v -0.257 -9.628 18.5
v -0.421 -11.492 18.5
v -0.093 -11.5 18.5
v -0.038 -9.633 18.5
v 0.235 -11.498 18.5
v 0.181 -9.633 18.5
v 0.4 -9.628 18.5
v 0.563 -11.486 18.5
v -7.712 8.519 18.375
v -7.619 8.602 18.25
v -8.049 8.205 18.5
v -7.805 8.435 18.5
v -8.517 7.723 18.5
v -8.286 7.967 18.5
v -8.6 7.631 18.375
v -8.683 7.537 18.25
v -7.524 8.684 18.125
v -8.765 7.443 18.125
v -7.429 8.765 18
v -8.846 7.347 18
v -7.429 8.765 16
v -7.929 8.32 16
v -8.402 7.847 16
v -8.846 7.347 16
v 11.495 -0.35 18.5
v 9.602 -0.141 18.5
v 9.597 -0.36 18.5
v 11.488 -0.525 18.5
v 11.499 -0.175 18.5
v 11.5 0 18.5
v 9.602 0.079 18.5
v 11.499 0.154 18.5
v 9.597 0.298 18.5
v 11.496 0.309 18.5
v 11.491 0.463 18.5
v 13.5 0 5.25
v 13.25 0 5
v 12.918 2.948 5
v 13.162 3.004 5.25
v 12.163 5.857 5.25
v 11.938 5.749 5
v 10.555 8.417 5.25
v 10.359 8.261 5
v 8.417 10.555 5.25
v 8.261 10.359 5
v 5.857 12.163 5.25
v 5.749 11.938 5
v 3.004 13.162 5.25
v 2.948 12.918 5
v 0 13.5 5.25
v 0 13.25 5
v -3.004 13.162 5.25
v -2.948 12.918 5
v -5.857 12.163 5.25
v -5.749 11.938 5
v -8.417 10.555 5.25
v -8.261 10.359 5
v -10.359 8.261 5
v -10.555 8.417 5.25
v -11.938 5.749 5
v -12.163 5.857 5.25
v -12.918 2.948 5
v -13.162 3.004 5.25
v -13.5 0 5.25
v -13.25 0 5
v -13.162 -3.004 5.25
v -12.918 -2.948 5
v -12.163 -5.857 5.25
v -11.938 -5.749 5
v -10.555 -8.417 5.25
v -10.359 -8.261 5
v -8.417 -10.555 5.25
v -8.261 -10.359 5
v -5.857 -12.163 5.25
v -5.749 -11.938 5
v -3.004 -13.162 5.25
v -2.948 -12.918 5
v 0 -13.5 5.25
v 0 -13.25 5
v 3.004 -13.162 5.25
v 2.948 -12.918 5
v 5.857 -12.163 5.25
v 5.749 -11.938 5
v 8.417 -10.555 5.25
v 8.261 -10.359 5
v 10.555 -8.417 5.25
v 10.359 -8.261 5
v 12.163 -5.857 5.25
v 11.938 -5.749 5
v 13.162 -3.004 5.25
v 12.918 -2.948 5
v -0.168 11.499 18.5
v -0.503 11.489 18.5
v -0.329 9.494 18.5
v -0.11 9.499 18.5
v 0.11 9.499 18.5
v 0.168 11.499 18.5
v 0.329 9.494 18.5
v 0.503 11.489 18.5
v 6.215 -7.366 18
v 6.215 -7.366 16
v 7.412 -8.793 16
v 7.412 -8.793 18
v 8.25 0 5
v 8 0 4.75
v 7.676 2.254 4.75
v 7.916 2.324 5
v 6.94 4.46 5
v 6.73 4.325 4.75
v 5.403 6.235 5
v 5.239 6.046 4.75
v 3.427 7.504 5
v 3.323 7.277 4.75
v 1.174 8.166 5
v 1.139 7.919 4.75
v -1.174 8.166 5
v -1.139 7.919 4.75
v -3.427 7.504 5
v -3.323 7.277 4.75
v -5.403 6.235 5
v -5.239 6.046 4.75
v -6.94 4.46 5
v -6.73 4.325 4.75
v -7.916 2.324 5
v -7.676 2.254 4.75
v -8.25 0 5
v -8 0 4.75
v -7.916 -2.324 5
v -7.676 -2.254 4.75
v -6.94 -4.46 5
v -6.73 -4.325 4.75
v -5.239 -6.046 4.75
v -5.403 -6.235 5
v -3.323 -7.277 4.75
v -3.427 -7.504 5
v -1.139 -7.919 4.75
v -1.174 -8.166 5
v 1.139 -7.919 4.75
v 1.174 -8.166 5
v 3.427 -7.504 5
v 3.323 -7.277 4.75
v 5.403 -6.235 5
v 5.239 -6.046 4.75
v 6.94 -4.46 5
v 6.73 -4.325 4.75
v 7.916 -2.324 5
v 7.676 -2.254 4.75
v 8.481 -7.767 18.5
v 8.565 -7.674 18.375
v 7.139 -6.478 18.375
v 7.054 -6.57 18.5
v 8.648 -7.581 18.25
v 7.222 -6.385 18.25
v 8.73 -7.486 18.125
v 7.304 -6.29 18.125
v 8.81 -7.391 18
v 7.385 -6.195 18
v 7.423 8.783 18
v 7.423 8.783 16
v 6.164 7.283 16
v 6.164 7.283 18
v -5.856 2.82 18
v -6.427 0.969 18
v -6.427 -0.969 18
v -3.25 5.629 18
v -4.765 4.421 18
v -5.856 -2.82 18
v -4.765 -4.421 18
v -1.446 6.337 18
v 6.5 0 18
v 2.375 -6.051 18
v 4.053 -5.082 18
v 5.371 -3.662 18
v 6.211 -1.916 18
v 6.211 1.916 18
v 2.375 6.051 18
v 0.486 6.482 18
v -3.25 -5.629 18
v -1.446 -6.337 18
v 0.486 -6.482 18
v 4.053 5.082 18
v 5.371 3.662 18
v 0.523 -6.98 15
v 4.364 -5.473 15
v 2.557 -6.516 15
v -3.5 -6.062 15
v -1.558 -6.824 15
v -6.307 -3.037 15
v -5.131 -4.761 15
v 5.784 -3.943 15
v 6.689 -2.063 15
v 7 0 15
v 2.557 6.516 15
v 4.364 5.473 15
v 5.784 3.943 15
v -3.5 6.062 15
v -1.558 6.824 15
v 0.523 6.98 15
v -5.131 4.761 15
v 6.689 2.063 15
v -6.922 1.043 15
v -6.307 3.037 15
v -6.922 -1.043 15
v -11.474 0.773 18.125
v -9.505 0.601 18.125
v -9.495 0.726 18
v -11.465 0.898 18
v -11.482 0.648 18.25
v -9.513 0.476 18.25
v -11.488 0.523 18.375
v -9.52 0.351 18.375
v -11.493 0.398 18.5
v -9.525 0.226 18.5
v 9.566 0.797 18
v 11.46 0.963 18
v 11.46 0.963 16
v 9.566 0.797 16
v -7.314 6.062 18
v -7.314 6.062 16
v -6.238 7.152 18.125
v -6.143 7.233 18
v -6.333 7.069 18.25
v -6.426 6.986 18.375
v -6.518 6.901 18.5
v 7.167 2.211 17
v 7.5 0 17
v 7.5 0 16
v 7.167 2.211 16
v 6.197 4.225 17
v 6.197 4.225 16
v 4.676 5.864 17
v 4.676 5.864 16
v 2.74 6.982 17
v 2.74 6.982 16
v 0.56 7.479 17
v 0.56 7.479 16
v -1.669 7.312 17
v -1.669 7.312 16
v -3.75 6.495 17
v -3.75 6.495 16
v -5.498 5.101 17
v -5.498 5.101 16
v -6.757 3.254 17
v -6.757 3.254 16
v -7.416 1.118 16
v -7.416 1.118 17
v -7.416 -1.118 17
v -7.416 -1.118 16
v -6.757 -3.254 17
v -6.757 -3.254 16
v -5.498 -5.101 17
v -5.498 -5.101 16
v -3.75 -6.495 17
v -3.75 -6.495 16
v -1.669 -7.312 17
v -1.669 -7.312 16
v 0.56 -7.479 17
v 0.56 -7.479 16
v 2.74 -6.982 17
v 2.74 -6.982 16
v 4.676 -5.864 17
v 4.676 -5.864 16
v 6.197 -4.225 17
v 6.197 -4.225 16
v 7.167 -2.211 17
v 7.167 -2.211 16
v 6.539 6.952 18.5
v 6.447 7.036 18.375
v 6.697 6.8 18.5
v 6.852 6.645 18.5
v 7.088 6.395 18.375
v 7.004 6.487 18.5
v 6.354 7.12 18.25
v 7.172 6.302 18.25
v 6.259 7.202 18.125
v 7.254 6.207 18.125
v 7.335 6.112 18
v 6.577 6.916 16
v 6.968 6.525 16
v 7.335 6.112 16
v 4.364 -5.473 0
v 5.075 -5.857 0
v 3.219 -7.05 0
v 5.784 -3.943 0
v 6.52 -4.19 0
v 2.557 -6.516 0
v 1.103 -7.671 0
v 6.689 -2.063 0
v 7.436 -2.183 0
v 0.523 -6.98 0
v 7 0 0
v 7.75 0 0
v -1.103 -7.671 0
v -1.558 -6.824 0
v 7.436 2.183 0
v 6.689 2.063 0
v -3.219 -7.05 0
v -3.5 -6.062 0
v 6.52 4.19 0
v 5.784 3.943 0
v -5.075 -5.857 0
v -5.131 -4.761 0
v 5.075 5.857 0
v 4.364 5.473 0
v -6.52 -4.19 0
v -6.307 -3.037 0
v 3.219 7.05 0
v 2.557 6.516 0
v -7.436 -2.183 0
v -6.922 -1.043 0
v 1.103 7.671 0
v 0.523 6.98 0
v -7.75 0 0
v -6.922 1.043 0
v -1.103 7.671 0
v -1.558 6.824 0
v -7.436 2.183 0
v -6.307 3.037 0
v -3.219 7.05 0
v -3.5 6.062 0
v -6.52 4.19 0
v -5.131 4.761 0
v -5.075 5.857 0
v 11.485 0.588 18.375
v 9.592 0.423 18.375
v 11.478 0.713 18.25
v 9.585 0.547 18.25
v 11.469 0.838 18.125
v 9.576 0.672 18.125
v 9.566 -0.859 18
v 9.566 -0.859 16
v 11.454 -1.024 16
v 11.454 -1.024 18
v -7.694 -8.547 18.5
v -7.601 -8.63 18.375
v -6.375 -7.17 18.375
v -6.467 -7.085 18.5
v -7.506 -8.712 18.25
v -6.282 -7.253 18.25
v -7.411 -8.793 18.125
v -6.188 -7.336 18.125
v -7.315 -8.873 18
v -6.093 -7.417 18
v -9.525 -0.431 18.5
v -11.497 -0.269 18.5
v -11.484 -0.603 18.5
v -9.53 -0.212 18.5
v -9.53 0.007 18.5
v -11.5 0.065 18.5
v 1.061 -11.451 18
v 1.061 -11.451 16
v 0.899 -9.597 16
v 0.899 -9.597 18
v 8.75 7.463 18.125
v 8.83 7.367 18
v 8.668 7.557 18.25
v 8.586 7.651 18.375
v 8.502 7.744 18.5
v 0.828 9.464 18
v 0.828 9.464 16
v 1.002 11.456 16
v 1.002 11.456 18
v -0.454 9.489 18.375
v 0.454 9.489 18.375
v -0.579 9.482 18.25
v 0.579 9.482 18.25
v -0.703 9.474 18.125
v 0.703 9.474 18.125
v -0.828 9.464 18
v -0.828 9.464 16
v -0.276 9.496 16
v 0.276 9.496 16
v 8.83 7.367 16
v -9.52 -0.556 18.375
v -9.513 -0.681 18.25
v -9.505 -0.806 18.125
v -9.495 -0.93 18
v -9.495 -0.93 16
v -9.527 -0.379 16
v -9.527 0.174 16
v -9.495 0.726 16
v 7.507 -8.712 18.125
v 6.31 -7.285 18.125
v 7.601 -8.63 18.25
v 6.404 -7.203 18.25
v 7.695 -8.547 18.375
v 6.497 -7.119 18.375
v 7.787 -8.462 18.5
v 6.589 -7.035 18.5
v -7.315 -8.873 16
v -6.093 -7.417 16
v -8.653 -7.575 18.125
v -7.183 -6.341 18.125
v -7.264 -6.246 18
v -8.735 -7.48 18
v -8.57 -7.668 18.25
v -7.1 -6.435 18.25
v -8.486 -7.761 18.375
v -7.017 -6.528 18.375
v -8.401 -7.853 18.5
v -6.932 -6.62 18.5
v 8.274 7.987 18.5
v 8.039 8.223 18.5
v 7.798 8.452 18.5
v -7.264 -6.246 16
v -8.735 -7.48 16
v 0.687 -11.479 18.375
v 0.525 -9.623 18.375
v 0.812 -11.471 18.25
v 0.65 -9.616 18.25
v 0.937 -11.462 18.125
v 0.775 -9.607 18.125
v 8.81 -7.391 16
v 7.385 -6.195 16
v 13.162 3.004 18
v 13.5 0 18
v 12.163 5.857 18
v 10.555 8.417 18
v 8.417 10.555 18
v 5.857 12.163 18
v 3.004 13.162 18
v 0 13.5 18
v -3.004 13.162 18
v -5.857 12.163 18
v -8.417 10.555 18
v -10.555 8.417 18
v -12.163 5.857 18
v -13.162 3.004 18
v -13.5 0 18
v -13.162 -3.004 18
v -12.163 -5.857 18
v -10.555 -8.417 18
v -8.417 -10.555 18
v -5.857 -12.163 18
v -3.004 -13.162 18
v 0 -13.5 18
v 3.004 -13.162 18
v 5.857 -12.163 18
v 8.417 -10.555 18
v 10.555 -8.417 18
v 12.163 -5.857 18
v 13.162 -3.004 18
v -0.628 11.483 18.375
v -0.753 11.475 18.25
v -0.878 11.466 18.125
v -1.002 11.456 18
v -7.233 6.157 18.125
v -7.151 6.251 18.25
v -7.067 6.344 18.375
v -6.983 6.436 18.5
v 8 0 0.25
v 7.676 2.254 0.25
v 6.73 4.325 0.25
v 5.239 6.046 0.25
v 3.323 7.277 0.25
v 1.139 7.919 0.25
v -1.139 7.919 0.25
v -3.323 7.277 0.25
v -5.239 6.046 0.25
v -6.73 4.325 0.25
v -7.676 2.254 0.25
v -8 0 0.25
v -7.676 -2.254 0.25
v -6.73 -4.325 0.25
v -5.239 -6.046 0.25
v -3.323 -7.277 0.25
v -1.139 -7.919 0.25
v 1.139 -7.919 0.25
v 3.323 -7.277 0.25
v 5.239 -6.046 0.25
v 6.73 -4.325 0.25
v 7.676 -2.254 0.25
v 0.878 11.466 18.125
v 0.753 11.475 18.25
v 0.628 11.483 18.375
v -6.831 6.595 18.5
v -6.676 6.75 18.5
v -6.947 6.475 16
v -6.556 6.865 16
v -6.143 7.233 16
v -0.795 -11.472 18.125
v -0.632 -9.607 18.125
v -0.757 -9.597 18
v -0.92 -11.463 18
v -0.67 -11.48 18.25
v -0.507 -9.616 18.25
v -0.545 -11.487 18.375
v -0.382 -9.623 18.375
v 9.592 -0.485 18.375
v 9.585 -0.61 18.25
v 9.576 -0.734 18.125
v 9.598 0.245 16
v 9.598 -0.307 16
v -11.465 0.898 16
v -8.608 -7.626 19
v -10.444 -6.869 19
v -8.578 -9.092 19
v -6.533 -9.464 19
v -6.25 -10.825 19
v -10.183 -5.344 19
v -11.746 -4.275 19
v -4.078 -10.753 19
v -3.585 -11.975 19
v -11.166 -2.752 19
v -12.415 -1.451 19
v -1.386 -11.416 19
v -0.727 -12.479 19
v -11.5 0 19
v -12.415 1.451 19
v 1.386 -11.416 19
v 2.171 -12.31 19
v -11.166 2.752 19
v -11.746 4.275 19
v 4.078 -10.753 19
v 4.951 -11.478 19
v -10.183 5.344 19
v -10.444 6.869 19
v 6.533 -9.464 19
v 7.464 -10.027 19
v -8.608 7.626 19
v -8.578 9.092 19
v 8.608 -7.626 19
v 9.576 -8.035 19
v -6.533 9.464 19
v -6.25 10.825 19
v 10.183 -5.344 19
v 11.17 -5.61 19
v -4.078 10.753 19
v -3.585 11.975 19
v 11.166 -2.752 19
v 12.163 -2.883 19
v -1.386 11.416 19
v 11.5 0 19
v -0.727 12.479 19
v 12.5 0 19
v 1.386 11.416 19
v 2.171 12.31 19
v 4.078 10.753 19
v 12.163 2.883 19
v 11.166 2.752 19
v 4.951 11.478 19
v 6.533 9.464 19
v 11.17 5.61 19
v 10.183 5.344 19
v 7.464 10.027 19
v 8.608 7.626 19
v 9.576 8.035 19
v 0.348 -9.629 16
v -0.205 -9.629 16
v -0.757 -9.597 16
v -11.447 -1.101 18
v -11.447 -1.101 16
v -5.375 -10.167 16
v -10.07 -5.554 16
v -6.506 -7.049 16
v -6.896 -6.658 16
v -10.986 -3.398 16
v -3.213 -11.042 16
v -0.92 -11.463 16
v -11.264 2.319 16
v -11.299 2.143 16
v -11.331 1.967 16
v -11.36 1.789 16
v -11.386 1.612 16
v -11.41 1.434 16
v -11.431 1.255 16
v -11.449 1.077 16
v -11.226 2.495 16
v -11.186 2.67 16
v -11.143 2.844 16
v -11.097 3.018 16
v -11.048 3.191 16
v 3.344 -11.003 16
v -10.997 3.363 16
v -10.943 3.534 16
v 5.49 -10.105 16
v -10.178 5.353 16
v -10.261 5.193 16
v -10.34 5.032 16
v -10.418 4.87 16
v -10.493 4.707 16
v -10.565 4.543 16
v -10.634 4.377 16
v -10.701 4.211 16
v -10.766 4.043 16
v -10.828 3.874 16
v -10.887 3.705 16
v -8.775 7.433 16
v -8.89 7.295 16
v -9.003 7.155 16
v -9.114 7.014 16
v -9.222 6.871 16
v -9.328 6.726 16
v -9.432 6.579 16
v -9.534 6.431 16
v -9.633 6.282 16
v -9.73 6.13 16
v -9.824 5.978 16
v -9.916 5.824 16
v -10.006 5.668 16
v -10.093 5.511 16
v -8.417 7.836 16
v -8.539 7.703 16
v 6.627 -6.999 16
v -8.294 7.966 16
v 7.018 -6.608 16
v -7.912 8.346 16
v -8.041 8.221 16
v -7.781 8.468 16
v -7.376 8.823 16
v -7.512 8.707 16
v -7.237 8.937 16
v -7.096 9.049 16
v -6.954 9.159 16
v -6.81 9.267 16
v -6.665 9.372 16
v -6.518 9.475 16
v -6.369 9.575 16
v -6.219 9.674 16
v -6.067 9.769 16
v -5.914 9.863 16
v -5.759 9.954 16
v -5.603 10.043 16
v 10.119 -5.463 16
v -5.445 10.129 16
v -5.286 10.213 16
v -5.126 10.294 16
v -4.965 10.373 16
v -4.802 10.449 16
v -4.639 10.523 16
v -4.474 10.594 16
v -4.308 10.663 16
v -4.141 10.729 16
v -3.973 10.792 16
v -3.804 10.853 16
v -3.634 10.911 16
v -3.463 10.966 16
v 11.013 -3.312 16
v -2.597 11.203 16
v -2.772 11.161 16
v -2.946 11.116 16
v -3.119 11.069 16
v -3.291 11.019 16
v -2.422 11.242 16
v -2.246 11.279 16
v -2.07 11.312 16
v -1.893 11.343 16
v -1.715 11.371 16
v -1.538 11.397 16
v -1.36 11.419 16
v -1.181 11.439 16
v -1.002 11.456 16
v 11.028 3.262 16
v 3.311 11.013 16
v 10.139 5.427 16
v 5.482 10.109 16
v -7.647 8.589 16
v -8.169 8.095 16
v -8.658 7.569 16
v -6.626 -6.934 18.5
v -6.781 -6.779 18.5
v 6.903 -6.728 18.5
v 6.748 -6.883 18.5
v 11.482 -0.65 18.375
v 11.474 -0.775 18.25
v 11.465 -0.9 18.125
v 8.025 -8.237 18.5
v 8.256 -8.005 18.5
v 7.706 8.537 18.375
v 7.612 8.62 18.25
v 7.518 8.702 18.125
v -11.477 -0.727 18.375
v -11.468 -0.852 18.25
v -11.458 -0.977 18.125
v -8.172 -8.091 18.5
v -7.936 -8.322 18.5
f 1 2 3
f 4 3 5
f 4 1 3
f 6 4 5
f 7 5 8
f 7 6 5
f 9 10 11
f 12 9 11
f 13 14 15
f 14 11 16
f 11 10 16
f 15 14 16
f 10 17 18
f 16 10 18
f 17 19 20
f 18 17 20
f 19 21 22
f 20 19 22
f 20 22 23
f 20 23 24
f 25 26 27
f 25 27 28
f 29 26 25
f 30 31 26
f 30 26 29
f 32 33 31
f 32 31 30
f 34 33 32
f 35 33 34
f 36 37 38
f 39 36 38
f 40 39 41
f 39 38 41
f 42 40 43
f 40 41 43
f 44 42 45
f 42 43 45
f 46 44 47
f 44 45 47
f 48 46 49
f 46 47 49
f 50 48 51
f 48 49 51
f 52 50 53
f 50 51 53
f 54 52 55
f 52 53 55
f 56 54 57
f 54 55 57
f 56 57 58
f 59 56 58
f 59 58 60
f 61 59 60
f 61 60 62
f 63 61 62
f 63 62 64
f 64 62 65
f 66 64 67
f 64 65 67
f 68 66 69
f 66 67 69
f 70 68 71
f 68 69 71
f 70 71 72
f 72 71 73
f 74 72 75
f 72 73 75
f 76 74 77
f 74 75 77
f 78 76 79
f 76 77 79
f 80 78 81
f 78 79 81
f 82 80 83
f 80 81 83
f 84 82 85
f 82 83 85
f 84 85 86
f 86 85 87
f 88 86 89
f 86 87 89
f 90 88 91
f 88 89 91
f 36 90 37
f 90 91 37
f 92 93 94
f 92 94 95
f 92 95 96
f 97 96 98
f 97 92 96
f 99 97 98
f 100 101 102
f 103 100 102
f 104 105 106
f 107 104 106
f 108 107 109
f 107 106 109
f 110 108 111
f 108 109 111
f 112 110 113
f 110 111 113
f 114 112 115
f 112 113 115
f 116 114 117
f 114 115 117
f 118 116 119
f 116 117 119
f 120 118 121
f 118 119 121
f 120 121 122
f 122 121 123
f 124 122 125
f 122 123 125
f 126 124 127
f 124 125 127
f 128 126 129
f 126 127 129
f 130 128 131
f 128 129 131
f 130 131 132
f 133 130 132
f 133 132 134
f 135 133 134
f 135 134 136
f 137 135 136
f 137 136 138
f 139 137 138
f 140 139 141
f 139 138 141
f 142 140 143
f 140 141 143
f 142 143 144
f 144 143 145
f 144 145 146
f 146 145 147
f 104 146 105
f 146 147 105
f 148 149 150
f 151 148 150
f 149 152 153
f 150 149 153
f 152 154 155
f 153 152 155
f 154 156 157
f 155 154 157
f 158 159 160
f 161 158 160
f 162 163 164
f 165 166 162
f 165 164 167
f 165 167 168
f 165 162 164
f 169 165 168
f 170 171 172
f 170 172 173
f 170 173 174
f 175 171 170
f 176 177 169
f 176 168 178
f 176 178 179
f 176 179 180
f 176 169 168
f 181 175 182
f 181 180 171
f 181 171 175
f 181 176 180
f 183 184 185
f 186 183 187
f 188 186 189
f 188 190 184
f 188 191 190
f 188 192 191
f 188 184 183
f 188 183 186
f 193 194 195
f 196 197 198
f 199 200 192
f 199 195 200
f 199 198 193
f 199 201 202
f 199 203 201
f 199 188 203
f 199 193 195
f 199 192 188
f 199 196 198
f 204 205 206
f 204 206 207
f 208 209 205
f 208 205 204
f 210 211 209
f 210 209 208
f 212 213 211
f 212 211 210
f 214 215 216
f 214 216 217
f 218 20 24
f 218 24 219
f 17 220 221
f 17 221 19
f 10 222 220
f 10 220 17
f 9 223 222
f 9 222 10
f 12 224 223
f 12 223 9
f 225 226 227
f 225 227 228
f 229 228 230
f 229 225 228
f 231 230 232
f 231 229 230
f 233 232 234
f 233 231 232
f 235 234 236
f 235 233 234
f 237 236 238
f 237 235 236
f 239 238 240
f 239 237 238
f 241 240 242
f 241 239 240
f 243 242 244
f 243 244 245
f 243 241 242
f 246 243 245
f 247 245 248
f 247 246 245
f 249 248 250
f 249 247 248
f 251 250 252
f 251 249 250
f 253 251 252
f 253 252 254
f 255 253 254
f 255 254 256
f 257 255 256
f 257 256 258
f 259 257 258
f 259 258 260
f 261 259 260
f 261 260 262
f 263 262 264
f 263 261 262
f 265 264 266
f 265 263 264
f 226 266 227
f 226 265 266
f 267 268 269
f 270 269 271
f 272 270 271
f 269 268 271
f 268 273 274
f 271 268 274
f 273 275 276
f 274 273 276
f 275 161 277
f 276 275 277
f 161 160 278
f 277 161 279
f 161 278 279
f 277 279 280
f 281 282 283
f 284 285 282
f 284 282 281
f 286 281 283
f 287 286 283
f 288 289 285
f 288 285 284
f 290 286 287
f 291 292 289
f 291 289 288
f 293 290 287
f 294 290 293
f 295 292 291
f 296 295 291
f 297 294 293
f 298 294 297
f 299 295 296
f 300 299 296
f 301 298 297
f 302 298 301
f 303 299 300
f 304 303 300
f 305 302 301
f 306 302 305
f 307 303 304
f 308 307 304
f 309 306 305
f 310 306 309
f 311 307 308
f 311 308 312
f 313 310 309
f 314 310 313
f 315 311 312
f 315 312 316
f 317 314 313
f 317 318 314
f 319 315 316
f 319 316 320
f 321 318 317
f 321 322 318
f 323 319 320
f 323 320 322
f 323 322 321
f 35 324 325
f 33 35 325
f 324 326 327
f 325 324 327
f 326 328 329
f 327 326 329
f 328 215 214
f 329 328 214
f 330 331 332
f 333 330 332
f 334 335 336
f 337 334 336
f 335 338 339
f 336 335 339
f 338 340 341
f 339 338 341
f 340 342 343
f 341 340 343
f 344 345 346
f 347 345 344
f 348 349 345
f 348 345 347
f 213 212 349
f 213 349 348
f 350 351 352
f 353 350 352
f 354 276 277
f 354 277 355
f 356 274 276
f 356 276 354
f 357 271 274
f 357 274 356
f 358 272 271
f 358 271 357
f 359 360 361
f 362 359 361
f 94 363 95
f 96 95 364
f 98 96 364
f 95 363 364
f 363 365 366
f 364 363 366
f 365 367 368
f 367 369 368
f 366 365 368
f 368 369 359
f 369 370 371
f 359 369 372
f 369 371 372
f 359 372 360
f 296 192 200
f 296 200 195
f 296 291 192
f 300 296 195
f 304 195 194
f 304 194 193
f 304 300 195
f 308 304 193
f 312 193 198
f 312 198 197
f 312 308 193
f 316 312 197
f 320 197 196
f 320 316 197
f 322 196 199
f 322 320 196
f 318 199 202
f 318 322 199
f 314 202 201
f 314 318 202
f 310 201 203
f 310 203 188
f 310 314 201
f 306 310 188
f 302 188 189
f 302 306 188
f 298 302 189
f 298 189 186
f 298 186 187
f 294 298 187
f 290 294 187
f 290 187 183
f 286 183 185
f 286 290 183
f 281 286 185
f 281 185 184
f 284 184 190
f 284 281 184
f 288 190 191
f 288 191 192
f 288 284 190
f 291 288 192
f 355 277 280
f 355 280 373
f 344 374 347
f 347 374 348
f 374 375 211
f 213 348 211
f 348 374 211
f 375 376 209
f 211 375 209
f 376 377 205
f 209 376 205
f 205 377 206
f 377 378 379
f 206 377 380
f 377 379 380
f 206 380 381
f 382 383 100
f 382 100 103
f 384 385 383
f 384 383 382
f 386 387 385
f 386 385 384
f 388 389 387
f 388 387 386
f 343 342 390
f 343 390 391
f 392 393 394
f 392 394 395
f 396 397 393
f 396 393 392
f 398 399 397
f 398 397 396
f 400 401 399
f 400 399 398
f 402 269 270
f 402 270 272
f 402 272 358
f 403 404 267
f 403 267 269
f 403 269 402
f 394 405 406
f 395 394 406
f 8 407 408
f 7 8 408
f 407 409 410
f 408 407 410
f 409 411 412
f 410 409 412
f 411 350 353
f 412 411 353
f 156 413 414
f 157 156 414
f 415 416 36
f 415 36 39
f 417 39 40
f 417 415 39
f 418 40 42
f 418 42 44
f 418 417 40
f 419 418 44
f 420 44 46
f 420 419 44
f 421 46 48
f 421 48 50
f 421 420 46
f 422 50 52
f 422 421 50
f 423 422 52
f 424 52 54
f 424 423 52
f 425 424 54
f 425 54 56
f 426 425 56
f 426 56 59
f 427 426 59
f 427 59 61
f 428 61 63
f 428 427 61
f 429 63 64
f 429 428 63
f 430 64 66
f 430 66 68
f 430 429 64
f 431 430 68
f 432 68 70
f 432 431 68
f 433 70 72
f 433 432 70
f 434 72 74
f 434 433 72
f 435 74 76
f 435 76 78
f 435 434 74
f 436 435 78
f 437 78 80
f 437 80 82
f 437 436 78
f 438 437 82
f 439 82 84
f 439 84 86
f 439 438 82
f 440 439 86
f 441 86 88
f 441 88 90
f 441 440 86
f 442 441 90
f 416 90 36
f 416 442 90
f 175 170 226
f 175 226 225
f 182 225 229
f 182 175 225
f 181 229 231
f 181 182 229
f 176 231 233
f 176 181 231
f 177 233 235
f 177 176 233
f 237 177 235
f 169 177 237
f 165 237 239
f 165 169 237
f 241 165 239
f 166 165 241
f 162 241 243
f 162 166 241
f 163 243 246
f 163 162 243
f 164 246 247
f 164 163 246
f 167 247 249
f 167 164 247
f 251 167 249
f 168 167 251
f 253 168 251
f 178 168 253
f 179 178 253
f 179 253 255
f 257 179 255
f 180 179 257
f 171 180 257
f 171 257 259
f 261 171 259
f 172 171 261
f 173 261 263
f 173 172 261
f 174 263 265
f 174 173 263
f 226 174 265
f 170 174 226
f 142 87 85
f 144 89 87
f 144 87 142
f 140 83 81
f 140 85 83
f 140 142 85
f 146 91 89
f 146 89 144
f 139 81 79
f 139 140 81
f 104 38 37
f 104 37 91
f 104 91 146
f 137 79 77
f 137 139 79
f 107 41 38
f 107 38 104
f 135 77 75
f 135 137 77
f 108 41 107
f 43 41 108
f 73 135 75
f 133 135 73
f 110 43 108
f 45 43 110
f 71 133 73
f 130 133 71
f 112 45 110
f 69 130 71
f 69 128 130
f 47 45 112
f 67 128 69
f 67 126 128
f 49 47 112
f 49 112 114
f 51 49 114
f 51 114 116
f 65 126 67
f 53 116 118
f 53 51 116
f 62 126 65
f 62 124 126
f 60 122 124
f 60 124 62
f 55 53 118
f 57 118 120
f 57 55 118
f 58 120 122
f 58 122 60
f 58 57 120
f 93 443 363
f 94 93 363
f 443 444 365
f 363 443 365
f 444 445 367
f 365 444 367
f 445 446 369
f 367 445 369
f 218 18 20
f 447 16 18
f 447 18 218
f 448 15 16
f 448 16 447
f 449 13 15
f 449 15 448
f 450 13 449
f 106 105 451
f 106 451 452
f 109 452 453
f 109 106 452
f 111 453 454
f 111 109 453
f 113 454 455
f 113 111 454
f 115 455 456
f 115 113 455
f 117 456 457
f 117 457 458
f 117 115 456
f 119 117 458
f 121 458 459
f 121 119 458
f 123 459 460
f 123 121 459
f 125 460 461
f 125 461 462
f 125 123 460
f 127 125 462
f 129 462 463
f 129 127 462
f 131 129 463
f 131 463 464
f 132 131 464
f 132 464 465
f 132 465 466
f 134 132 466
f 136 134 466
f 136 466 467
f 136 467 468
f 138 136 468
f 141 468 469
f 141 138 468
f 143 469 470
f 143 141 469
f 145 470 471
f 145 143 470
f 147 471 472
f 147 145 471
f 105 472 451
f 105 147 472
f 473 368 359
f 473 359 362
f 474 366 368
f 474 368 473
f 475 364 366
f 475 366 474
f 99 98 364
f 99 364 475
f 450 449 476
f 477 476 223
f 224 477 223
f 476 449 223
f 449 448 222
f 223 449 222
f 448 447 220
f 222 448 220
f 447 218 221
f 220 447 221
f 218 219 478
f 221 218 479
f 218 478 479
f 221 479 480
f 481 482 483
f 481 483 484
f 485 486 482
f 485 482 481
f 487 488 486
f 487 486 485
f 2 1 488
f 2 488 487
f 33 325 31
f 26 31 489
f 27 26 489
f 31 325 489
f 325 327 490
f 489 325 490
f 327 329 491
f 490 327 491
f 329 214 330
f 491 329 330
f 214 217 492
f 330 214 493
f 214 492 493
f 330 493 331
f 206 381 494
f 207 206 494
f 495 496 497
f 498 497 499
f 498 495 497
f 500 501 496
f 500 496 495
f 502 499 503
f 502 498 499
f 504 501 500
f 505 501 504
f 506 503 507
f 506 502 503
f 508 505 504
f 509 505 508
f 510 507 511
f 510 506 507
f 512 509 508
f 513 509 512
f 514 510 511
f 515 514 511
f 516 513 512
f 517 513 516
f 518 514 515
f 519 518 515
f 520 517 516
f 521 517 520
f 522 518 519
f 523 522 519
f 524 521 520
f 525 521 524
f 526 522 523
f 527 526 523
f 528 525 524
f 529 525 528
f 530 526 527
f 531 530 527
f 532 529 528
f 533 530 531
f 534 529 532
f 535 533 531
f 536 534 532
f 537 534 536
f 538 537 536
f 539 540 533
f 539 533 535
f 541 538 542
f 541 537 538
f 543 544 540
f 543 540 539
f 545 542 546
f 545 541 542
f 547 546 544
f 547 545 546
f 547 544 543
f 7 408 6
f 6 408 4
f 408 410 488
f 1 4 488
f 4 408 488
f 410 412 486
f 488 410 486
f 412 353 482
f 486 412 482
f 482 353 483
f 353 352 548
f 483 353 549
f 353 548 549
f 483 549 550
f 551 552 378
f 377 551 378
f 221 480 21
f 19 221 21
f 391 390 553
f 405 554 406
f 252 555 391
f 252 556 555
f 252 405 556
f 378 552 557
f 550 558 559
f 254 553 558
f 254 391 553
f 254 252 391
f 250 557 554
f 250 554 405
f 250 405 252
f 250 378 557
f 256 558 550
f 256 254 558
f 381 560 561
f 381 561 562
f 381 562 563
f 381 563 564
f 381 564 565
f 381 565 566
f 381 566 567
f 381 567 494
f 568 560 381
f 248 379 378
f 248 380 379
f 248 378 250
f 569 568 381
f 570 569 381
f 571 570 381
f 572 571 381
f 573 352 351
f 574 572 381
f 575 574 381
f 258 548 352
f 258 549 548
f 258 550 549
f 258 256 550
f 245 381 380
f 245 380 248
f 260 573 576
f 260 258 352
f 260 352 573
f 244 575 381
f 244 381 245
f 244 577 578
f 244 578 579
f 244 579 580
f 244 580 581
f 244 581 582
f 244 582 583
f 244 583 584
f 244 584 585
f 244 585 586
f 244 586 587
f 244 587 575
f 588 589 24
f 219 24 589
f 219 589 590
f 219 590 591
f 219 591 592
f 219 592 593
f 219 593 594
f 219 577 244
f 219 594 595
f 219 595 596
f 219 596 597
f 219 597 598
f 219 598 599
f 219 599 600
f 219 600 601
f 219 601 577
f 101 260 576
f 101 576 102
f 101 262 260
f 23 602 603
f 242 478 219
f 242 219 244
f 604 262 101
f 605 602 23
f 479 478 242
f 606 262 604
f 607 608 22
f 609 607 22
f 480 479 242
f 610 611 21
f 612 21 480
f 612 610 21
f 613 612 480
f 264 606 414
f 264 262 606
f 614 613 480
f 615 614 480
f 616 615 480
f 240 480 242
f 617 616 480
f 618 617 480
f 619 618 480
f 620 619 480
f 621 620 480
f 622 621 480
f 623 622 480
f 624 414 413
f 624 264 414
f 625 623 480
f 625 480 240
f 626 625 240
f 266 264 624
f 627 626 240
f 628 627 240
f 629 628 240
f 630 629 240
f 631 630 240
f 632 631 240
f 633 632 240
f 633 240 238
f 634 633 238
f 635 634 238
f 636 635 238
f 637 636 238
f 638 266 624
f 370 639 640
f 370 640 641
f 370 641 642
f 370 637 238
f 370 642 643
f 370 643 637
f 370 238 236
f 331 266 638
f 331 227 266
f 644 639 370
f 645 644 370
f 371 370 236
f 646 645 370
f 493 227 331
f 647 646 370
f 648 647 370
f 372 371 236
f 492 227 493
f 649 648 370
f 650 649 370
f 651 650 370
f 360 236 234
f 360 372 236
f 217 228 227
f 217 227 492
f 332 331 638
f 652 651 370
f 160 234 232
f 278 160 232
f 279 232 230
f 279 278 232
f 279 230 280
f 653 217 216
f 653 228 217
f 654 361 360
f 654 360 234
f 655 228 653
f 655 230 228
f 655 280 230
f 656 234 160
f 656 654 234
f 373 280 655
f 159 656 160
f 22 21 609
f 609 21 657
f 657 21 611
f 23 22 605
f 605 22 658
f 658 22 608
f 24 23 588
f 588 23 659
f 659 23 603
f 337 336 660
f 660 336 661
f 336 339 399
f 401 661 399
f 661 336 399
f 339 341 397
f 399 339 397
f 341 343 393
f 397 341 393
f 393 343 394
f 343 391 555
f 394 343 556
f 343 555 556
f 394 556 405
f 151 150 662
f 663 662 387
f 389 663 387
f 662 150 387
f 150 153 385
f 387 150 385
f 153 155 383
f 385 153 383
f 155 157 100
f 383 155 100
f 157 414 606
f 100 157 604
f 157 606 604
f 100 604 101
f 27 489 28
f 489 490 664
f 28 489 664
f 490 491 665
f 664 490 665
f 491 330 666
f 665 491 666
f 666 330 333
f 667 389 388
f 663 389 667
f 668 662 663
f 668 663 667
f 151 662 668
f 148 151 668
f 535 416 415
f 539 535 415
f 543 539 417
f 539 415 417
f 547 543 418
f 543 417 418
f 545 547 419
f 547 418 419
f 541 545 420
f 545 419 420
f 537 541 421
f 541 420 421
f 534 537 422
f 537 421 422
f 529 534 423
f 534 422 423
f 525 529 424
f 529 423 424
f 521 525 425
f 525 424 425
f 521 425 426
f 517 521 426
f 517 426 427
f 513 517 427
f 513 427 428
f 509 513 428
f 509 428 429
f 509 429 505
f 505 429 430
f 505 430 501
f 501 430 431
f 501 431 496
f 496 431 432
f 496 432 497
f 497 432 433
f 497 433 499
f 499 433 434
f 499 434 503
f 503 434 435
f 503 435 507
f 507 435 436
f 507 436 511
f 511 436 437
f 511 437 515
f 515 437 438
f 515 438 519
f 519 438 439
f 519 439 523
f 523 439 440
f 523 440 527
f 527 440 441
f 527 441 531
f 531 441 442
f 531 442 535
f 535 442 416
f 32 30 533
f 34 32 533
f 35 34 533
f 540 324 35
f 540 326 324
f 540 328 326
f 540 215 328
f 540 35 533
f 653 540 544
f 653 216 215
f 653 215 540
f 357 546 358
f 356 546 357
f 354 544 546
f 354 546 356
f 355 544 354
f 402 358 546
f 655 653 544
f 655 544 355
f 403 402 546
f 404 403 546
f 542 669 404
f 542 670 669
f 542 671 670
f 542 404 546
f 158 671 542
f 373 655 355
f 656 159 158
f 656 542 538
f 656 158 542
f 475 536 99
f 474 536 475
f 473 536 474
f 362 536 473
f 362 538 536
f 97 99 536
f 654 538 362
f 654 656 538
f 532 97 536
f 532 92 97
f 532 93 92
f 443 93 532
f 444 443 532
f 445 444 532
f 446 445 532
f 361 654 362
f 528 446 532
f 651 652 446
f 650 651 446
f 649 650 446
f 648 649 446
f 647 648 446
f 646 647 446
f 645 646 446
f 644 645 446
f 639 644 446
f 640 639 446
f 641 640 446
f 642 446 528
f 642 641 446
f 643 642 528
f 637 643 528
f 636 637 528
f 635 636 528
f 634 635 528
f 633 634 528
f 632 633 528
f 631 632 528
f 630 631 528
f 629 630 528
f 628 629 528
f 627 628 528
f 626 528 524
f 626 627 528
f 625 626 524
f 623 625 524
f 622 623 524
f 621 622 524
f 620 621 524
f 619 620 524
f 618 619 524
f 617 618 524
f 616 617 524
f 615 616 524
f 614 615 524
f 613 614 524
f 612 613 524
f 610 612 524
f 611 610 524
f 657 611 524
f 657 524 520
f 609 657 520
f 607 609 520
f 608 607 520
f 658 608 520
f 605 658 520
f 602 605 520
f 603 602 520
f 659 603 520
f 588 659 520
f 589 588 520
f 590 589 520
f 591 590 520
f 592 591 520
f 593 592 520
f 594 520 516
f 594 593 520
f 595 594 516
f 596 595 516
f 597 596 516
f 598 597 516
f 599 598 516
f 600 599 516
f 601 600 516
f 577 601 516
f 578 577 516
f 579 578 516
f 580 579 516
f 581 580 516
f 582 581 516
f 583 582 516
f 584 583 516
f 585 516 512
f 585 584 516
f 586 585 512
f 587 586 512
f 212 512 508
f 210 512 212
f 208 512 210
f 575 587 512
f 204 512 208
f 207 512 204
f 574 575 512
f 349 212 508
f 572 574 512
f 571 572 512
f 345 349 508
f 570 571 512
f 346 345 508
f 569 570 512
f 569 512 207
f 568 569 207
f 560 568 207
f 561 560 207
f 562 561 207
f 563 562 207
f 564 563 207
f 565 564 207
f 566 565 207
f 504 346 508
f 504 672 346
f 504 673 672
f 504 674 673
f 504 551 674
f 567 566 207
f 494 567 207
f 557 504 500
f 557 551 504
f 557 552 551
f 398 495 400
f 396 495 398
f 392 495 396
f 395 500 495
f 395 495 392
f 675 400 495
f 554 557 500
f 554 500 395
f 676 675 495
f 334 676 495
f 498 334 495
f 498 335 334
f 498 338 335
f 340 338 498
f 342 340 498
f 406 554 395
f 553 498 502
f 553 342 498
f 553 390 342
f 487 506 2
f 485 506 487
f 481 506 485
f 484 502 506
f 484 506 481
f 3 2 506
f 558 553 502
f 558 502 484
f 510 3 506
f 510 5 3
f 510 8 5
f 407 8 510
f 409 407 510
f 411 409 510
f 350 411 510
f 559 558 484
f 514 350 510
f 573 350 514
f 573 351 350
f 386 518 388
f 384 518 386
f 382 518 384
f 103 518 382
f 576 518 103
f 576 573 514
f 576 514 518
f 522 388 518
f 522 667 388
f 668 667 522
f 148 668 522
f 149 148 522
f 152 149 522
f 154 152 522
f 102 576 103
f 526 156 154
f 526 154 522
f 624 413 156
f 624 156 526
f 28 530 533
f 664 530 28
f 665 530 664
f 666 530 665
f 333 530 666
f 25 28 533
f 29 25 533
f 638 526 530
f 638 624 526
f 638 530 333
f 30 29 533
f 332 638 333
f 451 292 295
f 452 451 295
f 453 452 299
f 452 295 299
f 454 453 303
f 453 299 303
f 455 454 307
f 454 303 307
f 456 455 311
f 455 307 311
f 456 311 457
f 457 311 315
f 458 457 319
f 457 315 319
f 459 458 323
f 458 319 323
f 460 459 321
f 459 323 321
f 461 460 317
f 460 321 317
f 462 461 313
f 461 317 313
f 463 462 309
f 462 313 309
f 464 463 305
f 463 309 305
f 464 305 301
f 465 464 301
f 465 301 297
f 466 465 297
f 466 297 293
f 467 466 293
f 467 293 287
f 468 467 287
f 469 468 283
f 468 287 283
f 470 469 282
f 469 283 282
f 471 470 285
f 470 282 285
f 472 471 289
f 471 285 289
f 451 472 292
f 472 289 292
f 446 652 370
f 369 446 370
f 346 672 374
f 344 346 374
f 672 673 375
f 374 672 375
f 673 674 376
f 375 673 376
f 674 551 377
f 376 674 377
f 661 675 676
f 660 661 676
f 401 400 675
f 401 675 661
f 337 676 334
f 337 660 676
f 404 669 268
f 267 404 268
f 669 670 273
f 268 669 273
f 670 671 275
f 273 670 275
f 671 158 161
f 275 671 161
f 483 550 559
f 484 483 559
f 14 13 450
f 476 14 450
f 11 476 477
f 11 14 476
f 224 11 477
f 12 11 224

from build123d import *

# Parameters (mm, degrees)
F3_DEPTH = 2.5
F4_SIZE  = 1
F5_SIZE  = 0.5
F6_SIZE  = 0.25


# Not quite as in the source:
# - a feature names something its author has since deleted; it is built from what else it names


with BuildPart() as f1:
    # F0 (on Front) → F1 (revolve)
    with BuildSketch(Plane.XZ):
        Polygon((7, 15), (7, 0), (8, 0), (8, 5), (13.5, 5), (13.5, 19), (11.5, 19), (11.5, 16), (7.5, 16), (7.5, 18), (0, 18), (0, 15), align=None)
    revolve(axis=Axis((0, 0, 16.5), (0, 0, 1)))

    # F2 (on face) → F3 (join)
    with BuildSketch(Plane.XY.offset(16)):
        with BuildLine():
            Line((0.8279795561, 9.4638496319), (1.0022910416, 11.4562390281))
            ThreePointArc((1.0022910416, 11.4562390281), (0, 11.5), (-1.0022910416, 11.4562390281))
            Line((-1.0022910416, 11.4562390281), (-0.8279795561, 9.4638496319))
            ThreePointArc((-0.8279795561, 9.4638496319), (0, 9.5), (0.8279795561, 9.4638496319))
        make_face()
        with BuildLine():
            ThreePointArc((8.8304981344, 7.3669737816), (8.1575715841, 8.1058019869), (7.4230424297, 8.7834185308))
            Line((7.4230424297, 8.7834185308), (6.1641167123, 7.2830892843))
            ThreePointArc((6.1641167123, 7.2830892843), (6.7751488416, 6.723181496), (7.3350566299, 6.1121493667))
            Line((7.3350566299, 6.1121493667), (8.8304981344, 7.3669737816))
        make_face()
        with BuildLine():
            ThreePointArc((11.5, 0), (11.4899071638, 0.4816984201), (11.4596463708, 0.9625513265))
            Line((11.4596463708, 0.9625513265), (9.5662449685, 0.7969001683))
            ThreePointArc((9.5662449685, 0.7969001683), (9.6023953367, -0.0310793878), (9.5662449685, -0.8590589439))
            Line((9.5662449685, -0.8590589439), (11.4542973626, -1.0242421245))
            ThreePointArc((11.4542973626, -1.0242421245), (11.4885686591, -0.5126306323), (11.5, 0))
        make_face()
        with BuildLine():
            ThreePointArc((7.4117695743, -8.7929330588), (8.141359766, -8.1220847792), (8.810476783, -7.3909064976))
            Line((8.810476783, -7.3909064976), (7.385484621, -6.1951961001))
            ThreePointArc((7.385484621, -6.1951961001), (6.8255768326, -6.8062282293), (6.2145447034, -7.3661360177))
            Line((6.2145447034, -7.3661360177), (7.4117695743, -8.7929330588))
        make_face()
        with BuildLine():
            Line((-0.7566636072, -9.5973243563), (-0.9199020931, -11.4631487881))
            ThreePointArc((-0.9199020931, -11.4631487881), (0.0710446065, -11.4997805485), (1.0614630688, -11.450908093))
            Line((1.0614630688, -11.450908093), (0.899295505, -9.5973243563))
            ThreePointArc((0.899295505, -9.5973243563), (0.0713159489, -9.6334747244), (-0.7566636072, -9.5973243563))
        make_face()
        with BuildLine():
            Line((-7.263740681, -6.2456240912), (-8.7349008301, -7.4800740296))
            ThreePointArc((-8.7349008301, -7.4800740296), (-8.0552507812, -8.2074926044), (-7.3152358724, -8.8734054416))
            Line((-7.3152358724, -8.8734054416), (-6.0928007634, -7.4165640088))
            ThreePointArc((-6.0928007634, -7.4165640088), (-6.7038328927, -6.8566562204), (-7.263740681, -6.2456240912))
        make_face()
        with BuildLine():
            Line((-9.4949290196, 0.7255842194), (-11.464890553, 0.8979335212))
            ThreePointArc((-11.464890553, 0.8979335212), (-11.4995475928, -0.1020056943), (-11.4471576619, -1.1011727676))
            Line((-11.4471576619, -1.1011727676), (-9.4949290196, -0.9303748928))
            ThreePointArc((-9.4949290196, -0.9303748928), (-9.5310793878, -0.1023953367), (-9.4949290196, 0.7255842194))
        make_face()
        with BuildLine():
            ThreePointArc((-11.4471576619, -1.1011727676), (-11.4995475928, -0.1020056943), (-11.464890553, 0.8979335212))
            Line((-11.464890553, 0.8979335212), (-11.4873184158, 0.8998957049))
            ThreePointArc((-11.4873184158, 0.8998957049), (-11.5310793878, -0.1023953367), (-11.4873184158, -1.1046863783))
            Line((-11.4873184158, -1.1046863783), (-11.4471576619, -1.1011727676))
        make_face()
        with BuildLine():
            Line((-6.1432287545, 7.2326612933), (-7.4288039739, 8.7647501795))
            ThreePointArc((-7.4288039739, 8.7647501795), (-8.1684744461, 8.0869670673), (-8.8462575583, 7.347296595))
            Line((-8.8462575583, 7.347296595), (-7.3141686721, 6.0617213757))
            ThreePointArc((-7.3141686721, 6.0617213757), (-6.7542608837, 6.6727535049), (-6.1432287545, 7.2326612933))
        make_face()
    extrude(amount=F3_DEPTH)

    # F4
    f4_edges = [f1.edges().sort_by_distance(p)[0] for p in [
        (-13.5, 0, 19),
        (-7.5, 0, 18),
    ]]
    chamfer(f4_edges, length=F4_SIZE)

    # F5
    f5_edges = [f1.edges().sort_by_distance(p)[0] for p in [
        (-10.471043, -1.015774, 18.5),
        (-10.47991, 0.811759, 18.5),
        (-8.080213, 6.704509, 18.5),
        (-6.786016, 7.998706, 18.5),
        (-0.915135, 10.460044, 18.5),
        (0.915135, 10.460044, 18.5),
        (-6.704018, -8.144985, 18.5),
        (-7.999321, -6.862849, 18.5),
        (0.980379, -10.524116, 18.5),
        (-0.838283, -10.530237, 18.5),
        (8.097981, -6.793051, 18.5),
        (6.813157, -8.079535, 18.5),
        (10.512946, 0.879726, 18.5),
        (10.510271, -0.941651, 18.5),
        (8.082777, 6.739562, 18.5),
        (6.79358, 8.033254, 18.5),
    ]]
    chamfer(f5_edges, length=F5_SIZE)

    # F6
    f6_edges = [f1.edges().sort_by_distance(p)[0] for p in [
        (-13.5, 0, 5),
        (-8, 0, 5),
        (-8, 0, 0),
    ]]
    chamfer(f6_edges, length=F6_SIZE)


solid = f1.part
